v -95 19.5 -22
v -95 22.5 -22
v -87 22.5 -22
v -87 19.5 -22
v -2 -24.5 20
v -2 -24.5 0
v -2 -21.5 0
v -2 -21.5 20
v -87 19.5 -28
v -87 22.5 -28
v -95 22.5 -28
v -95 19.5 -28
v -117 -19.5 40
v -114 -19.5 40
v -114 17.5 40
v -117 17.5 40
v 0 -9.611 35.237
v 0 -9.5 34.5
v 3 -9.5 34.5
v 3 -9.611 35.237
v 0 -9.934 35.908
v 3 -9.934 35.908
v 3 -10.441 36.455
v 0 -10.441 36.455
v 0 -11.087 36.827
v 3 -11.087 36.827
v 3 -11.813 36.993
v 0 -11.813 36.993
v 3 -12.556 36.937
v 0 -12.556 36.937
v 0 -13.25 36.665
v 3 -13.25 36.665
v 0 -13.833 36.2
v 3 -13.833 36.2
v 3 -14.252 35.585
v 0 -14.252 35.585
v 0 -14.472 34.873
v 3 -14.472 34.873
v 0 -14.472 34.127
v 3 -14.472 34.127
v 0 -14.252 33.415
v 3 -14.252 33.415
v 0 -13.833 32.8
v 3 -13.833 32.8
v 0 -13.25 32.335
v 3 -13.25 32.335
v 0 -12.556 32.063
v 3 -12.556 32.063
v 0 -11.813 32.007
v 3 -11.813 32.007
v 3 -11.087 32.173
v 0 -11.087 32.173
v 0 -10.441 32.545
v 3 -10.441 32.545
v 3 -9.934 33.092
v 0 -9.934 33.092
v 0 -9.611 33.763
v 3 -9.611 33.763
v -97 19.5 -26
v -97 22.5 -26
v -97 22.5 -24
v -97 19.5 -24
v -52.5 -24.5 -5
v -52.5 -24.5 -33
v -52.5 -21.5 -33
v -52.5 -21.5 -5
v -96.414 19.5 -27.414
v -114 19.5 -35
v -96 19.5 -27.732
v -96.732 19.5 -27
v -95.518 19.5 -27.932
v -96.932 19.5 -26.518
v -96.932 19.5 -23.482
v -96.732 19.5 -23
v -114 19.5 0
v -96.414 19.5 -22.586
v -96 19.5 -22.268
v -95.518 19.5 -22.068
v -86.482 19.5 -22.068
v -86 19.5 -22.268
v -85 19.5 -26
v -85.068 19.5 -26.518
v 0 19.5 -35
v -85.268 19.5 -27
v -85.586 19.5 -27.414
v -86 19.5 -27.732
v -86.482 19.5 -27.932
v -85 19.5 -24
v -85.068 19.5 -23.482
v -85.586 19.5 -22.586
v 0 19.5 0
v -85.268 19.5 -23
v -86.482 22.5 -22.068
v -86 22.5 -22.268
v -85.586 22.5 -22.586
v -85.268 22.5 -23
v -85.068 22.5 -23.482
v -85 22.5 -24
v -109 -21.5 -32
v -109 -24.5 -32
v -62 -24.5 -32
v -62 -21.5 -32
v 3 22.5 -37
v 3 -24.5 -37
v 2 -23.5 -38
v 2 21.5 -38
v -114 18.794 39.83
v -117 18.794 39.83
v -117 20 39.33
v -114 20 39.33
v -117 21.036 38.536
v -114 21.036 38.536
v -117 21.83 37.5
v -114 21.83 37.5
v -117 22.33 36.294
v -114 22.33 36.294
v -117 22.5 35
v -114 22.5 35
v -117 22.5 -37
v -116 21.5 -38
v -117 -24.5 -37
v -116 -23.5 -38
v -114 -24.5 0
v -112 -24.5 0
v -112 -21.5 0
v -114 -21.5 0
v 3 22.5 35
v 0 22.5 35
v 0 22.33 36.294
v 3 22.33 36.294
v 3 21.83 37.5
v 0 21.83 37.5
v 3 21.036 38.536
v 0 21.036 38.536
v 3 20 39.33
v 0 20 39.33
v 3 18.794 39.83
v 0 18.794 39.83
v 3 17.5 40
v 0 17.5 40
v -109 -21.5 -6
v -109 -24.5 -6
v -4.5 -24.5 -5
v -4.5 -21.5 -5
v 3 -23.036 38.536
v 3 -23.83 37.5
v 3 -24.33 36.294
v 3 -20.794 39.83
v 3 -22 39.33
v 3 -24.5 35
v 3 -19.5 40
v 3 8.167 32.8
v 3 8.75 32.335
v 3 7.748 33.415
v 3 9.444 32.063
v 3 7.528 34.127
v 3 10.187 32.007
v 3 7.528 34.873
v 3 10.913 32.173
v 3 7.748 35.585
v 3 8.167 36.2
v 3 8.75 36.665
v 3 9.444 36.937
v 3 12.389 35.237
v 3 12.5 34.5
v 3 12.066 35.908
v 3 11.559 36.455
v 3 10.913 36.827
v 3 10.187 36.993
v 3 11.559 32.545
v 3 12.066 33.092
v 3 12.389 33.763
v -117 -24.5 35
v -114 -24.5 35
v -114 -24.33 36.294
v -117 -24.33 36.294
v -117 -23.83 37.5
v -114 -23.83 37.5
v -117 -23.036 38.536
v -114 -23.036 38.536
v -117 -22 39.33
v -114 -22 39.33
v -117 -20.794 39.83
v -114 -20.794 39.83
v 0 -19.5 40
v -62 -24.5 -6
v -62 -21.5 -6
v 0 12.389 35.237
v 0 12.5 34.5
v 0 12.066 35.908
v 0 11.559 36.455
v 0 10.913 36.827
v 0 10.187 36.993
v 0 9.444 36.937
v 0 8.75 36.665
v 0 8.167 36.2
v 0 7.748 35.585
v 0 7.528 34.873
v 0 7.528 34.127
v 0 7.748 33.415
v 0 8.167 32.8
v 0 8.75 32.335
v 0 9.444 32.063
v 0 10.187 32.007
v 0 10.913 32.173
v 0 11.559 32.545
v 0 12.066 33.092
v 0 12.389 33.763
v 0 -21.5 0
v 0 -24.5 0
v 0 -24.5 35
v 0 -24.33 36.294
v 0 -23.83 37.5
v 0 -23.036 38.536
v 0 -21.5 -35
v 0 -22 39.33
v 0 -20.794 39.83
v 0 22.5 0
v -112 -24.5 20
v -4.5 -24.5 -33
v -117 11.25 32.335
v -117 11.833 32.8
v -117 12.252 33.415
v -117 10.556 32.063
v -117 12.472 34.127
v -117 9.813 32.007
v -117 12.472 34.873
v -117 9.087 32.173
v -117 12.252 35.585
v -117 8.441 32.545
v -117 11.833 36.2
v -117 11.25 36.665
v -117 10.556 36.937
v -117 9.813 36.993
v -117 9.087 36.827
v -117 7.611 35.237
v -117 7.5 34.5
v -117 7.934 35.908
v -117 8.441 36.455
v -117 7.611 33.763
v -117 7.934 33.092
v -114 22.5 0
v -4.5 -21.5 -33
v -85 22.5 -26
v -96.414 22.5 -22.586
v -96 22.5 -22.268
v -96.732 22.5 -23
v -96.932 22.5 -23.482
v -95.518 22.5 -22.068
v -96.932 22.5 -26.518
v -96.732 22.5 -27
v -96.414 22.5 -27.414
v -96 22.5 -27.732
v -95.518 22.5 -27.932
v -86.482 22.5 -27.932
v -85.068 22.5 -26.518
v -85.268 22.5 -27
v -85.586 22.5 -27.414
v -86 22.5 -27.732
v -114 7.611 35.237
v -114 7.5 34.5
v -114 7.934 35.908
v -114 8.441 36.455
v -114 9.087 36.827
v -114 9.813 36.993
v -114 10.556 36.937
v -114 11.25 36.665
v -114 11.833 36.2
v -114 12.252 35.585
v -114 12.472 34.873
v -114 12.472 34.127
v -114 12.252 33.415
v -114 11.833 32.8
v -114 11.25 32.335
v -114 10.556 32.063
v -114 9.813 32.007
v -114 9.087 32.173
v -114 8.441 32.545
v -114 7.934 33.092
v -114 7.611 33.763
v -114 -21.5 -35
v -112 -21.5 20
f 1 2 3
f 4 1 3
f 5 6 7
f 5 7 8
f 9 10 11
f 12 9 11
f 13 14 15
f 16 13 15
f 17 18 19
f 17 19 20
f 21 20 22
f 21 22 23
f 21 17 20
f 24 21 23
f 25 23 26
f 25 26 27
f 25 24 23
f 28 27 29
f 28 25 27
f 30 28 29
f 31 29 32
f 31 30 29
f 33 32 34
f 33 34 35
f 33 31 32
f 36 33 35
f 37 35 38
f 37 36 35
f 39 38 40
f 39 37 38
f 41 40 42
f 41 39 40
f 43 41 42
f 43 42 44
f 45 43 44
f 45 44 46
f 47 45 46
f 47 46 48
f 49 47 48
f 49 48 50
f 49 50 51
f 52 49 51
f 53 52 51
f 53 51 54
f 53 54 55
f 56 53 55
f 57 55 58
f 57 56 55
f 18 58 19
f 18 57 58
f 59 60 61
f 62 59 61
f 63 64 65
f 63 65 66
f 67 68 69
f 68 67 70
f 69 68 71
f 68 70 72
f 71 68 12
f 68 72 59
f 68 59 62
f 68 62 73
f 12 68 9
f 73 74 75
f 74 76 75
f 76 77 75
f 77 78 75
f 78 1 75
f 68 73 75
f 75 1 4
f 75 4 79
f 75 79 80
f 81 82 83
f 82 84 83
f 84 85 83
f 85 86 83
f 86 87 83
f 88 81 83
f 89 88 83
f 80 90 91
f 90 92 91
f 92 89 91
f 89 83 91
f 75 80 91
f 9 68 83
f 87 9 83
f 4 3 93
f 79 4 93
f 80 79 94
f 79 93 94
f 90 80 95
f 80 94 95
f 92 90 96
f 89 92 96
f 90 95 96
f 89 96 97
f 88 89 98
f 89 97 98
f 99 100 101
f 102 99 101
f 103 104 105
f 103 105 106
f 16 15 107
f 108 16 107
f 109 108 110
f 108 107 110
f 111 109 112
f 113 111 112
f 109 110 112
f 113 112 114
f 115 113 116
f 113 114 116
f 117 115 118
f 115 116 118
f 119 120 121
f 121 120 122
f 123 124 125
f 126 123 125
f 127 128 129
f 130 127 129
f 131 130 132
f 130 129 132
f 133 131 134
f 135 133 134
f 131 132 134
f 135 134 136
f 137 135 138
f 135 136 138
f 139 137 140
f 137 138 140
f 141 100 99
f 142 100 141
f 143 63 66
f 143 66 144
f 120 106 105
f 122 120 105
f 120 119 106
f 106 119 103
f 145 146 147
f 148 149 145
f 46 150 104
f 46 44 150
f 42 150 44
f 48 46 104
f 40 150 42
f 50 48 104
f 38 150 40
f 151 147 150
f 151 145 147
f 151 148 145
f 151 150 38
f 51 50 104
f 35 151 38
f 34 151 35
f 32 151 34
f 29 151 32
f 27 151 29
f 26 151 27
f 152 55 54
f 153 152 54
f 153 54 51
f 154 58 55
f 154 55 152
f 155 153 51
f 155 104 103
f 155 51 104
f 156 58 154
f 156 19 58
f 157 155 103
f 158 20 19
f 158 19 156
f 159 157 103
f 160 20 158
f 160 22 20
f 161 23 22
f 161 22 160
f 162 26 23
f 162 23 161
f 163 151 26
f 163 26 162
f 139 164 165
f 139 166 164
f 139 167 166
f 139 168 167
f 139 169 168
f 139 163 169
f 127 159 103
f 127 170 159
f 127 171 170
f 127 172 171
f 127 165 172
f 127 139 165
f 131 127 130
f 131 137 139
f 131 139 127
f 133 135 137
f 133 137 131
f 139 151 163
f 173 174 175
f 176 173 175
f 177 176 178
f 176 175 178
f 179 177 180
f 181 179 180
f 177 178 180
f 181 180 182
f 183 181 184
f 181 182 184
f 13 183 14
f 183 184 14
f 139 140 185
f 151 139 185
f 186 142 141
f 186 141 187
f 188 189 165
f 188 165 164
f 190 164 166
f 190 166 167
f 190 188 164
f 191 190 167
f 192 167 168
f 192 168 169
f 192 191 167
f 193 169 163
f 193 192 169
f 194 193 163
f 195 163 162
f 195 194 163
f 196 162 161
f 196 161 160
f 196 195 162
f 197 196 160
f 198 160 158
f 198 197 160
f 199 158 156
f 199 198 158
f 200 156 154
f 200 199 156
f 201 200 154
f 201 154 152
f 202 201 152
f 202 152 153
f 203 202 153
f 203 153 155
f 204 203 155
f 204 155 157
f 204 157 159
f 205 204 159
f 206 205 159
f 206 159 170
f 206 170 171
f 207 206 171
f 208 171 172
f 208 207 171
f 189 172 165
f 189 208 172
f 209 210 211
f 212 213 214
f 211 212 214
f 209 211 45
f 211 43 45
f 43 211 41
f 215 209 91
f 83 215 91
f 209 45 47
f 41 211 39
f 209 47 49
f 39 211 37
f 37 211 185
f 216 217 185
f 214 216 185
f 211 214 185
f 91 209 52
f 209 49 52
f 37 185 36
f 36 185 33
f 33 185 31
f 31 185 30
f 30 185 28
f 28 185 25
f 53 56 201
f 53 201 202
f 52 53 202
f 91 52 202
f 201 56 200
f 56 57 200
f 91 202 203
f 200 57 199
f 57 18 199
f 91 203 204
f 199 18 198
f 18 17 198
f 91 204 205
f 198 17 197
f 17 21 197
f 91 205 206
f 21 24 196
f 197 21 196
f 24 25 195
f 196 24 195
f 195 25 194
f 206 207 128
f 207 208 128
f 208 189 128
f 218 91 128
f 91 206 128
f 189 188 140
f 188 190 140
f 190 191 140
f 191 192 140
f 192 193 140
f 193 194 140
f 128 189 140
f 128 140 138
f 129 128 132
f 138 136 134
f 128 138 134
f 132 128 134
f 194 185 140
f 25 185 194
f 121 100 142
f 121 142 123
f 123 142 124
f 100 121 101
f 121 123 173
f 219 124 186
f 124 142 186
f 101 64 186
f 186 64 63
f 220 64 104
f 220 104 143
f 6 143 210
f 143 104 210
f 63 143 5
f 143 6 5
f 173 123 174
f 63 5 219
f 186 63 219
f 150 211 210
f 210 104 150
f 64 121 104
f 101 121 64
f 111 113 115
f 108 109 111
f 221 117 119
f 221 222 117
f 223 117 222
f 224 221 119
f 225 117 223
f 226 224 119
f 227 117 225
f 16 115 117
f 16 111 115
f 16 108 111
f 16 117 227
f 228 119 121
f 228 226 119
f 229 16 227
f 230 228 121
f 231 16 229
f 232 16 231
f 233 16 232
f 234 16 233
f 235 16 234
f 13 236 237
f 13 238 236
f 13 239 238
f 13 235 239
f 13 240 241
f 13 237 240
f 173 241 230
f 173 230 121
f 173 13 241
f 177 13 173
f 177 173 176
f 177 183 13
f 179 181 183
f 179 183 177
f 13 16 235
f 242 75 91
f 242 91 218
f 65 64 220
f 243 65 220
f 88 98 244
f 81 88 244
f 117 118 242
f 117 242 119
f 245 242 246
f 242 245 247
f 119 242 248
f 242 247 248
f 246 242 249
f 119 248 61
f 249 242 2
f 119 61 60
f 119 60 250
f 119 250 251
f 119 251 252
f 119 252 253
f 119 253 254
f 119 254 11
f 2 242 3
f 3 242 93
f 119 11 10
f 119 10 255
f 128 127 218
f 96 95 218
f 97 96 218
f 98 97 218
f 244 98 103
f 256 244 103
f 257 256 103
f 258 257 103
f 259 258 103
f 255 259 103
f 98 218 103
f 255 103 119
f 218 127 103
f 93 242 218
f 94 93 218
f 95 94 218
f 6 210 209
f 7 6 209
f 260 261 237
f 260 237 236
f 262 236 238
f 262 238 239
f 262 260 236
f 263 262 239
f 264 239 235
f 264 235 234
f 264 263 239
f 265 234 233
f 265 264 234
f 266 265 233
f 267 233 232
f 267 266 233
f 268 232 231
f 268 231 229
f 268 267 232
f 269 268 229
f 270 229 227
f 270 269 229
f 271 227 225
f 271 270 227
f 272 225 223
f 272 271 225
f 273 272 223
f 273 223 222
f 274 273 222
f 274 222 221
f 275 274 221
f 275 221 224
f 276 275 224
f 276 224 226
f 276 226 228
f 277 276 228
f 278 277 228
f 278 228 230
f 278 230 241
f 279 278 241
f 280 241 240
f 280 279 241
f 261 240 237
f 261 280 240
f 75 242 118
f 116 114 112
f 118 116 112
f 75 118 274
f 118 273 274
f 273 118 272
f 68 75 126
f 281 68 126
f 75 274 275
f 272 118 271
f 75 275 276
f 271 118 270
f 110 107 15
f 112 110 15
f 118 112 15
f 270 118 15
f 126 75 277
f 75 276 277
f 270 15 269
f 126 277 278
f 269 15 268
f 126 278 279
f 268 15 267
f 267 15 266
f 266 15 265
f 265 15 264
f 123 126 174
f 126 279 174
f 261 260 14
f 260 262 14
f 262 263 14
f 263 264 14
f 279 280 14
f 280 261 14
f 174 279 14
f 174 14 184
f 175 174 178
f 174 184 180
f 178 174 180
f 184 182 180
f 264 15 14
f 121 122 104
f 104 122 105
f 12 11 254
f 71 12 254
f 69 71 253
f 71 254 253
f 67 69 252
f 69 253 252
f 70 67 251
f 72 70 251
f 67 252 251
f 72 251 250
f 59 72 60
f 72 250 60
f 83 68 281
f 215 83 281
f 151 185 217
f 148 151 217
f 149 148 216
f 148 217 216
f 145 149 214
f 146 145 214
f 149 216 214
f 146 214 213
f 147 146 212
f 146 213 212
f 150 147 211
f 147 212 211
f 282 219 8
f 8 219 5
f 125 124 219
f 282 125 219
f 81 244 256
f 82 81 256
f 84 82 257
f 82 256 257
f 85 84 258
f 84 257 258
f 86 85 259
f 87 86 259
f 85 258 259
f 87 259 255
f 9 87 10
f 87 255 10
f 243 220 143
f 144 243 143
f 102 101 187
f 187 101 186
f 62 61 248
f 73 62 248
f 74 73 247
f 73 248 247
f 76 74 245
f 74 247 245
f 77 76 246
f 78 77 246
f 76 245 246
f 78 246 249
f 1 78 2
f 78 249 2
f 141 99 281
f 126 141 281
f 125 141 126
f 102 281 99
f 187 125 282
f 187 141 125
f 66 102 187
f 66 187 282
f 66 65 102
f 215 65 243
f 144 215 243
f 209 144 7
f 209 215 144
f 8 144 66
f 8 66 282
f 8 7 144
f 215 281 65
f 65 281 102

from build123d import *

# Parameters (mm, degrees)
F2_R      = 2.5
F3_DEPTH  = 3
F4_W      = 3
F4_H      = 3
F4_W_2    = 41
F4_H_2    = 35
F5_DEPTH  = 114
F6_R      = 2.5
F7_DEPTH  = 3
F8_W      = 110
F8_H      = 20
F9_DEPTH  = 3
F10_W     = 47
F10_H     = 26
F10_W_2   = 48
F10_H_2   = 28
F11_DEPTH = 3
F13_DEPTH = 3
F14_SIZE  = 1


with BuildPart() as f3:
    # F2 (on Right) → F3 (new body)
    with BuildSketch(Plane.YZ):
        with BuildLine():
            ThreePointArc((22.5, 35), (21.0355339059, 38.5355339059), (17.5, 40))
            Line((17.5, 40), (-19.5, 40))
            ThreePointArc((-19.5, 40), (-23.0355339059, 38.5355339059), (-24.5, 35))
            Line((-24.5, 35), (-24.5, -38))
            Line((-24.5, -38), (22.5, -38))
            Line((22.5, -38), (22.5, 35))
        make_face()
        with Locations((-12, 34.5)):
            Circle(F2_R, mode=Mode.SUBTRACT)
        with Locations((10, 34.5)):
            Circle(F2_R, mode=Mode.SUBTRACT)
    extrude(amount=F3_DEPTH)

    # F4 (on Right) → F5 (join)
    with BuildSketch(Plane.YZ):
        with Locations((21, -36.5)):
            Rectangle(F4_W, F4_H)
        with Locations((-1, -36.5)):
            Rectangle(F4_W_2, F4_H)
        with Locations((21, -17.5)):
            Rectangle(F4_W, F4_H_2)
        with Locations((-23, -36.5)):
            Rectangle(F4_W, F4_H)
        with Locations((-23, -17.5)):
            Rectangle(F4_W, F4_H_2)
    extrude(amount=-F5_DEPTH)

    # F6 (on face) → F7 (join)
    with BuildSketch(Plane(origin=(-114, 0, 0), x_dir=(0, -1, 0), z_dir=(-1, 0, 0))):
        with BuildLine():
            ThreePointArc((24.5, 35), (23.0355339059, 38.5355339059), (19.5, 40))
            Line((19.5, 40), (-17.5, 40))
            ThreePointArc((-17.5, 40), (-21.0355339059, 38.5355339059), (-22.5, 35))
            Line((-22.5, 35), (-22.5, -38))
            Line((-22.5, -38), (24.5, -38))
            Line((24.5, -38), (24.5, 35))
        make_face()
        with Locations((-10, 34.5)):
            Circle(F6_R, mode=Mode.SUBTRACT)
    extrude(amount=F7_DEPTH)

    # F8 (on face) → F9 (join)
    with BuildSketch(Plane.XZ.offset(24.5)):
        with Locations((-57, 10)):
            Rectangle(F8_W, F8_H)
    extrude(amount=-F9_DEPTH)

    # F10 (on face) → F11 (cut, through all)
    with BuildSketch(Plane.XZ.offset(24.5)):
        with Locations((-85.5, -19)):
            Rectangle(F10_W, F10_H)
        with Locations((-28.5, -19)):
            Rectangle(F10_W_2, F10_H_2)
    extrude(amount=-F11_DEPTH, mode=Mode.SUBTRACT)

    # F12 (on face) → F13 (cut, through all)
    with BuildSketch(Plane(origin=(0, 22.5, 0), x_dir=(-1, 0, 0), z_dir=(0, 1, 0))):
        with BuildLine():
            ThreePointArc((85, -26), (85.5857864376, -27.4142135624), (87, -28))
            Line((87, -28), (95, -28))
            ThreePointArc((95, -28), (96.4142135624, -27.4142135624), (97, -26))
            Line((97, -26), (97, -24))
            ThreePointArc((97, -24), (96.4142135624, -22.5857864376), (95, -22))
            Line((95, -22), (87, -22))
            ThreePointArc((87, -22), (85.5857864376, -22.5857864376), (85, -24))
            Line((85, -24), (85, -26))
        make_face()
    extrude(amount=-F13_DEPTH, mode=Mode.SUBTRACT)

    # F14
    f14_edges = [f3.edges().sort_by_distance(p)[0] for p in [
        (-57, -24.5, -38),
        (3, -1, -38),
        (-57, 22.5, -38),
        (-117, -1, -38),
    ]]
    chamfer(f14_edges, length=F14_SIZE)


solid = f3.part
